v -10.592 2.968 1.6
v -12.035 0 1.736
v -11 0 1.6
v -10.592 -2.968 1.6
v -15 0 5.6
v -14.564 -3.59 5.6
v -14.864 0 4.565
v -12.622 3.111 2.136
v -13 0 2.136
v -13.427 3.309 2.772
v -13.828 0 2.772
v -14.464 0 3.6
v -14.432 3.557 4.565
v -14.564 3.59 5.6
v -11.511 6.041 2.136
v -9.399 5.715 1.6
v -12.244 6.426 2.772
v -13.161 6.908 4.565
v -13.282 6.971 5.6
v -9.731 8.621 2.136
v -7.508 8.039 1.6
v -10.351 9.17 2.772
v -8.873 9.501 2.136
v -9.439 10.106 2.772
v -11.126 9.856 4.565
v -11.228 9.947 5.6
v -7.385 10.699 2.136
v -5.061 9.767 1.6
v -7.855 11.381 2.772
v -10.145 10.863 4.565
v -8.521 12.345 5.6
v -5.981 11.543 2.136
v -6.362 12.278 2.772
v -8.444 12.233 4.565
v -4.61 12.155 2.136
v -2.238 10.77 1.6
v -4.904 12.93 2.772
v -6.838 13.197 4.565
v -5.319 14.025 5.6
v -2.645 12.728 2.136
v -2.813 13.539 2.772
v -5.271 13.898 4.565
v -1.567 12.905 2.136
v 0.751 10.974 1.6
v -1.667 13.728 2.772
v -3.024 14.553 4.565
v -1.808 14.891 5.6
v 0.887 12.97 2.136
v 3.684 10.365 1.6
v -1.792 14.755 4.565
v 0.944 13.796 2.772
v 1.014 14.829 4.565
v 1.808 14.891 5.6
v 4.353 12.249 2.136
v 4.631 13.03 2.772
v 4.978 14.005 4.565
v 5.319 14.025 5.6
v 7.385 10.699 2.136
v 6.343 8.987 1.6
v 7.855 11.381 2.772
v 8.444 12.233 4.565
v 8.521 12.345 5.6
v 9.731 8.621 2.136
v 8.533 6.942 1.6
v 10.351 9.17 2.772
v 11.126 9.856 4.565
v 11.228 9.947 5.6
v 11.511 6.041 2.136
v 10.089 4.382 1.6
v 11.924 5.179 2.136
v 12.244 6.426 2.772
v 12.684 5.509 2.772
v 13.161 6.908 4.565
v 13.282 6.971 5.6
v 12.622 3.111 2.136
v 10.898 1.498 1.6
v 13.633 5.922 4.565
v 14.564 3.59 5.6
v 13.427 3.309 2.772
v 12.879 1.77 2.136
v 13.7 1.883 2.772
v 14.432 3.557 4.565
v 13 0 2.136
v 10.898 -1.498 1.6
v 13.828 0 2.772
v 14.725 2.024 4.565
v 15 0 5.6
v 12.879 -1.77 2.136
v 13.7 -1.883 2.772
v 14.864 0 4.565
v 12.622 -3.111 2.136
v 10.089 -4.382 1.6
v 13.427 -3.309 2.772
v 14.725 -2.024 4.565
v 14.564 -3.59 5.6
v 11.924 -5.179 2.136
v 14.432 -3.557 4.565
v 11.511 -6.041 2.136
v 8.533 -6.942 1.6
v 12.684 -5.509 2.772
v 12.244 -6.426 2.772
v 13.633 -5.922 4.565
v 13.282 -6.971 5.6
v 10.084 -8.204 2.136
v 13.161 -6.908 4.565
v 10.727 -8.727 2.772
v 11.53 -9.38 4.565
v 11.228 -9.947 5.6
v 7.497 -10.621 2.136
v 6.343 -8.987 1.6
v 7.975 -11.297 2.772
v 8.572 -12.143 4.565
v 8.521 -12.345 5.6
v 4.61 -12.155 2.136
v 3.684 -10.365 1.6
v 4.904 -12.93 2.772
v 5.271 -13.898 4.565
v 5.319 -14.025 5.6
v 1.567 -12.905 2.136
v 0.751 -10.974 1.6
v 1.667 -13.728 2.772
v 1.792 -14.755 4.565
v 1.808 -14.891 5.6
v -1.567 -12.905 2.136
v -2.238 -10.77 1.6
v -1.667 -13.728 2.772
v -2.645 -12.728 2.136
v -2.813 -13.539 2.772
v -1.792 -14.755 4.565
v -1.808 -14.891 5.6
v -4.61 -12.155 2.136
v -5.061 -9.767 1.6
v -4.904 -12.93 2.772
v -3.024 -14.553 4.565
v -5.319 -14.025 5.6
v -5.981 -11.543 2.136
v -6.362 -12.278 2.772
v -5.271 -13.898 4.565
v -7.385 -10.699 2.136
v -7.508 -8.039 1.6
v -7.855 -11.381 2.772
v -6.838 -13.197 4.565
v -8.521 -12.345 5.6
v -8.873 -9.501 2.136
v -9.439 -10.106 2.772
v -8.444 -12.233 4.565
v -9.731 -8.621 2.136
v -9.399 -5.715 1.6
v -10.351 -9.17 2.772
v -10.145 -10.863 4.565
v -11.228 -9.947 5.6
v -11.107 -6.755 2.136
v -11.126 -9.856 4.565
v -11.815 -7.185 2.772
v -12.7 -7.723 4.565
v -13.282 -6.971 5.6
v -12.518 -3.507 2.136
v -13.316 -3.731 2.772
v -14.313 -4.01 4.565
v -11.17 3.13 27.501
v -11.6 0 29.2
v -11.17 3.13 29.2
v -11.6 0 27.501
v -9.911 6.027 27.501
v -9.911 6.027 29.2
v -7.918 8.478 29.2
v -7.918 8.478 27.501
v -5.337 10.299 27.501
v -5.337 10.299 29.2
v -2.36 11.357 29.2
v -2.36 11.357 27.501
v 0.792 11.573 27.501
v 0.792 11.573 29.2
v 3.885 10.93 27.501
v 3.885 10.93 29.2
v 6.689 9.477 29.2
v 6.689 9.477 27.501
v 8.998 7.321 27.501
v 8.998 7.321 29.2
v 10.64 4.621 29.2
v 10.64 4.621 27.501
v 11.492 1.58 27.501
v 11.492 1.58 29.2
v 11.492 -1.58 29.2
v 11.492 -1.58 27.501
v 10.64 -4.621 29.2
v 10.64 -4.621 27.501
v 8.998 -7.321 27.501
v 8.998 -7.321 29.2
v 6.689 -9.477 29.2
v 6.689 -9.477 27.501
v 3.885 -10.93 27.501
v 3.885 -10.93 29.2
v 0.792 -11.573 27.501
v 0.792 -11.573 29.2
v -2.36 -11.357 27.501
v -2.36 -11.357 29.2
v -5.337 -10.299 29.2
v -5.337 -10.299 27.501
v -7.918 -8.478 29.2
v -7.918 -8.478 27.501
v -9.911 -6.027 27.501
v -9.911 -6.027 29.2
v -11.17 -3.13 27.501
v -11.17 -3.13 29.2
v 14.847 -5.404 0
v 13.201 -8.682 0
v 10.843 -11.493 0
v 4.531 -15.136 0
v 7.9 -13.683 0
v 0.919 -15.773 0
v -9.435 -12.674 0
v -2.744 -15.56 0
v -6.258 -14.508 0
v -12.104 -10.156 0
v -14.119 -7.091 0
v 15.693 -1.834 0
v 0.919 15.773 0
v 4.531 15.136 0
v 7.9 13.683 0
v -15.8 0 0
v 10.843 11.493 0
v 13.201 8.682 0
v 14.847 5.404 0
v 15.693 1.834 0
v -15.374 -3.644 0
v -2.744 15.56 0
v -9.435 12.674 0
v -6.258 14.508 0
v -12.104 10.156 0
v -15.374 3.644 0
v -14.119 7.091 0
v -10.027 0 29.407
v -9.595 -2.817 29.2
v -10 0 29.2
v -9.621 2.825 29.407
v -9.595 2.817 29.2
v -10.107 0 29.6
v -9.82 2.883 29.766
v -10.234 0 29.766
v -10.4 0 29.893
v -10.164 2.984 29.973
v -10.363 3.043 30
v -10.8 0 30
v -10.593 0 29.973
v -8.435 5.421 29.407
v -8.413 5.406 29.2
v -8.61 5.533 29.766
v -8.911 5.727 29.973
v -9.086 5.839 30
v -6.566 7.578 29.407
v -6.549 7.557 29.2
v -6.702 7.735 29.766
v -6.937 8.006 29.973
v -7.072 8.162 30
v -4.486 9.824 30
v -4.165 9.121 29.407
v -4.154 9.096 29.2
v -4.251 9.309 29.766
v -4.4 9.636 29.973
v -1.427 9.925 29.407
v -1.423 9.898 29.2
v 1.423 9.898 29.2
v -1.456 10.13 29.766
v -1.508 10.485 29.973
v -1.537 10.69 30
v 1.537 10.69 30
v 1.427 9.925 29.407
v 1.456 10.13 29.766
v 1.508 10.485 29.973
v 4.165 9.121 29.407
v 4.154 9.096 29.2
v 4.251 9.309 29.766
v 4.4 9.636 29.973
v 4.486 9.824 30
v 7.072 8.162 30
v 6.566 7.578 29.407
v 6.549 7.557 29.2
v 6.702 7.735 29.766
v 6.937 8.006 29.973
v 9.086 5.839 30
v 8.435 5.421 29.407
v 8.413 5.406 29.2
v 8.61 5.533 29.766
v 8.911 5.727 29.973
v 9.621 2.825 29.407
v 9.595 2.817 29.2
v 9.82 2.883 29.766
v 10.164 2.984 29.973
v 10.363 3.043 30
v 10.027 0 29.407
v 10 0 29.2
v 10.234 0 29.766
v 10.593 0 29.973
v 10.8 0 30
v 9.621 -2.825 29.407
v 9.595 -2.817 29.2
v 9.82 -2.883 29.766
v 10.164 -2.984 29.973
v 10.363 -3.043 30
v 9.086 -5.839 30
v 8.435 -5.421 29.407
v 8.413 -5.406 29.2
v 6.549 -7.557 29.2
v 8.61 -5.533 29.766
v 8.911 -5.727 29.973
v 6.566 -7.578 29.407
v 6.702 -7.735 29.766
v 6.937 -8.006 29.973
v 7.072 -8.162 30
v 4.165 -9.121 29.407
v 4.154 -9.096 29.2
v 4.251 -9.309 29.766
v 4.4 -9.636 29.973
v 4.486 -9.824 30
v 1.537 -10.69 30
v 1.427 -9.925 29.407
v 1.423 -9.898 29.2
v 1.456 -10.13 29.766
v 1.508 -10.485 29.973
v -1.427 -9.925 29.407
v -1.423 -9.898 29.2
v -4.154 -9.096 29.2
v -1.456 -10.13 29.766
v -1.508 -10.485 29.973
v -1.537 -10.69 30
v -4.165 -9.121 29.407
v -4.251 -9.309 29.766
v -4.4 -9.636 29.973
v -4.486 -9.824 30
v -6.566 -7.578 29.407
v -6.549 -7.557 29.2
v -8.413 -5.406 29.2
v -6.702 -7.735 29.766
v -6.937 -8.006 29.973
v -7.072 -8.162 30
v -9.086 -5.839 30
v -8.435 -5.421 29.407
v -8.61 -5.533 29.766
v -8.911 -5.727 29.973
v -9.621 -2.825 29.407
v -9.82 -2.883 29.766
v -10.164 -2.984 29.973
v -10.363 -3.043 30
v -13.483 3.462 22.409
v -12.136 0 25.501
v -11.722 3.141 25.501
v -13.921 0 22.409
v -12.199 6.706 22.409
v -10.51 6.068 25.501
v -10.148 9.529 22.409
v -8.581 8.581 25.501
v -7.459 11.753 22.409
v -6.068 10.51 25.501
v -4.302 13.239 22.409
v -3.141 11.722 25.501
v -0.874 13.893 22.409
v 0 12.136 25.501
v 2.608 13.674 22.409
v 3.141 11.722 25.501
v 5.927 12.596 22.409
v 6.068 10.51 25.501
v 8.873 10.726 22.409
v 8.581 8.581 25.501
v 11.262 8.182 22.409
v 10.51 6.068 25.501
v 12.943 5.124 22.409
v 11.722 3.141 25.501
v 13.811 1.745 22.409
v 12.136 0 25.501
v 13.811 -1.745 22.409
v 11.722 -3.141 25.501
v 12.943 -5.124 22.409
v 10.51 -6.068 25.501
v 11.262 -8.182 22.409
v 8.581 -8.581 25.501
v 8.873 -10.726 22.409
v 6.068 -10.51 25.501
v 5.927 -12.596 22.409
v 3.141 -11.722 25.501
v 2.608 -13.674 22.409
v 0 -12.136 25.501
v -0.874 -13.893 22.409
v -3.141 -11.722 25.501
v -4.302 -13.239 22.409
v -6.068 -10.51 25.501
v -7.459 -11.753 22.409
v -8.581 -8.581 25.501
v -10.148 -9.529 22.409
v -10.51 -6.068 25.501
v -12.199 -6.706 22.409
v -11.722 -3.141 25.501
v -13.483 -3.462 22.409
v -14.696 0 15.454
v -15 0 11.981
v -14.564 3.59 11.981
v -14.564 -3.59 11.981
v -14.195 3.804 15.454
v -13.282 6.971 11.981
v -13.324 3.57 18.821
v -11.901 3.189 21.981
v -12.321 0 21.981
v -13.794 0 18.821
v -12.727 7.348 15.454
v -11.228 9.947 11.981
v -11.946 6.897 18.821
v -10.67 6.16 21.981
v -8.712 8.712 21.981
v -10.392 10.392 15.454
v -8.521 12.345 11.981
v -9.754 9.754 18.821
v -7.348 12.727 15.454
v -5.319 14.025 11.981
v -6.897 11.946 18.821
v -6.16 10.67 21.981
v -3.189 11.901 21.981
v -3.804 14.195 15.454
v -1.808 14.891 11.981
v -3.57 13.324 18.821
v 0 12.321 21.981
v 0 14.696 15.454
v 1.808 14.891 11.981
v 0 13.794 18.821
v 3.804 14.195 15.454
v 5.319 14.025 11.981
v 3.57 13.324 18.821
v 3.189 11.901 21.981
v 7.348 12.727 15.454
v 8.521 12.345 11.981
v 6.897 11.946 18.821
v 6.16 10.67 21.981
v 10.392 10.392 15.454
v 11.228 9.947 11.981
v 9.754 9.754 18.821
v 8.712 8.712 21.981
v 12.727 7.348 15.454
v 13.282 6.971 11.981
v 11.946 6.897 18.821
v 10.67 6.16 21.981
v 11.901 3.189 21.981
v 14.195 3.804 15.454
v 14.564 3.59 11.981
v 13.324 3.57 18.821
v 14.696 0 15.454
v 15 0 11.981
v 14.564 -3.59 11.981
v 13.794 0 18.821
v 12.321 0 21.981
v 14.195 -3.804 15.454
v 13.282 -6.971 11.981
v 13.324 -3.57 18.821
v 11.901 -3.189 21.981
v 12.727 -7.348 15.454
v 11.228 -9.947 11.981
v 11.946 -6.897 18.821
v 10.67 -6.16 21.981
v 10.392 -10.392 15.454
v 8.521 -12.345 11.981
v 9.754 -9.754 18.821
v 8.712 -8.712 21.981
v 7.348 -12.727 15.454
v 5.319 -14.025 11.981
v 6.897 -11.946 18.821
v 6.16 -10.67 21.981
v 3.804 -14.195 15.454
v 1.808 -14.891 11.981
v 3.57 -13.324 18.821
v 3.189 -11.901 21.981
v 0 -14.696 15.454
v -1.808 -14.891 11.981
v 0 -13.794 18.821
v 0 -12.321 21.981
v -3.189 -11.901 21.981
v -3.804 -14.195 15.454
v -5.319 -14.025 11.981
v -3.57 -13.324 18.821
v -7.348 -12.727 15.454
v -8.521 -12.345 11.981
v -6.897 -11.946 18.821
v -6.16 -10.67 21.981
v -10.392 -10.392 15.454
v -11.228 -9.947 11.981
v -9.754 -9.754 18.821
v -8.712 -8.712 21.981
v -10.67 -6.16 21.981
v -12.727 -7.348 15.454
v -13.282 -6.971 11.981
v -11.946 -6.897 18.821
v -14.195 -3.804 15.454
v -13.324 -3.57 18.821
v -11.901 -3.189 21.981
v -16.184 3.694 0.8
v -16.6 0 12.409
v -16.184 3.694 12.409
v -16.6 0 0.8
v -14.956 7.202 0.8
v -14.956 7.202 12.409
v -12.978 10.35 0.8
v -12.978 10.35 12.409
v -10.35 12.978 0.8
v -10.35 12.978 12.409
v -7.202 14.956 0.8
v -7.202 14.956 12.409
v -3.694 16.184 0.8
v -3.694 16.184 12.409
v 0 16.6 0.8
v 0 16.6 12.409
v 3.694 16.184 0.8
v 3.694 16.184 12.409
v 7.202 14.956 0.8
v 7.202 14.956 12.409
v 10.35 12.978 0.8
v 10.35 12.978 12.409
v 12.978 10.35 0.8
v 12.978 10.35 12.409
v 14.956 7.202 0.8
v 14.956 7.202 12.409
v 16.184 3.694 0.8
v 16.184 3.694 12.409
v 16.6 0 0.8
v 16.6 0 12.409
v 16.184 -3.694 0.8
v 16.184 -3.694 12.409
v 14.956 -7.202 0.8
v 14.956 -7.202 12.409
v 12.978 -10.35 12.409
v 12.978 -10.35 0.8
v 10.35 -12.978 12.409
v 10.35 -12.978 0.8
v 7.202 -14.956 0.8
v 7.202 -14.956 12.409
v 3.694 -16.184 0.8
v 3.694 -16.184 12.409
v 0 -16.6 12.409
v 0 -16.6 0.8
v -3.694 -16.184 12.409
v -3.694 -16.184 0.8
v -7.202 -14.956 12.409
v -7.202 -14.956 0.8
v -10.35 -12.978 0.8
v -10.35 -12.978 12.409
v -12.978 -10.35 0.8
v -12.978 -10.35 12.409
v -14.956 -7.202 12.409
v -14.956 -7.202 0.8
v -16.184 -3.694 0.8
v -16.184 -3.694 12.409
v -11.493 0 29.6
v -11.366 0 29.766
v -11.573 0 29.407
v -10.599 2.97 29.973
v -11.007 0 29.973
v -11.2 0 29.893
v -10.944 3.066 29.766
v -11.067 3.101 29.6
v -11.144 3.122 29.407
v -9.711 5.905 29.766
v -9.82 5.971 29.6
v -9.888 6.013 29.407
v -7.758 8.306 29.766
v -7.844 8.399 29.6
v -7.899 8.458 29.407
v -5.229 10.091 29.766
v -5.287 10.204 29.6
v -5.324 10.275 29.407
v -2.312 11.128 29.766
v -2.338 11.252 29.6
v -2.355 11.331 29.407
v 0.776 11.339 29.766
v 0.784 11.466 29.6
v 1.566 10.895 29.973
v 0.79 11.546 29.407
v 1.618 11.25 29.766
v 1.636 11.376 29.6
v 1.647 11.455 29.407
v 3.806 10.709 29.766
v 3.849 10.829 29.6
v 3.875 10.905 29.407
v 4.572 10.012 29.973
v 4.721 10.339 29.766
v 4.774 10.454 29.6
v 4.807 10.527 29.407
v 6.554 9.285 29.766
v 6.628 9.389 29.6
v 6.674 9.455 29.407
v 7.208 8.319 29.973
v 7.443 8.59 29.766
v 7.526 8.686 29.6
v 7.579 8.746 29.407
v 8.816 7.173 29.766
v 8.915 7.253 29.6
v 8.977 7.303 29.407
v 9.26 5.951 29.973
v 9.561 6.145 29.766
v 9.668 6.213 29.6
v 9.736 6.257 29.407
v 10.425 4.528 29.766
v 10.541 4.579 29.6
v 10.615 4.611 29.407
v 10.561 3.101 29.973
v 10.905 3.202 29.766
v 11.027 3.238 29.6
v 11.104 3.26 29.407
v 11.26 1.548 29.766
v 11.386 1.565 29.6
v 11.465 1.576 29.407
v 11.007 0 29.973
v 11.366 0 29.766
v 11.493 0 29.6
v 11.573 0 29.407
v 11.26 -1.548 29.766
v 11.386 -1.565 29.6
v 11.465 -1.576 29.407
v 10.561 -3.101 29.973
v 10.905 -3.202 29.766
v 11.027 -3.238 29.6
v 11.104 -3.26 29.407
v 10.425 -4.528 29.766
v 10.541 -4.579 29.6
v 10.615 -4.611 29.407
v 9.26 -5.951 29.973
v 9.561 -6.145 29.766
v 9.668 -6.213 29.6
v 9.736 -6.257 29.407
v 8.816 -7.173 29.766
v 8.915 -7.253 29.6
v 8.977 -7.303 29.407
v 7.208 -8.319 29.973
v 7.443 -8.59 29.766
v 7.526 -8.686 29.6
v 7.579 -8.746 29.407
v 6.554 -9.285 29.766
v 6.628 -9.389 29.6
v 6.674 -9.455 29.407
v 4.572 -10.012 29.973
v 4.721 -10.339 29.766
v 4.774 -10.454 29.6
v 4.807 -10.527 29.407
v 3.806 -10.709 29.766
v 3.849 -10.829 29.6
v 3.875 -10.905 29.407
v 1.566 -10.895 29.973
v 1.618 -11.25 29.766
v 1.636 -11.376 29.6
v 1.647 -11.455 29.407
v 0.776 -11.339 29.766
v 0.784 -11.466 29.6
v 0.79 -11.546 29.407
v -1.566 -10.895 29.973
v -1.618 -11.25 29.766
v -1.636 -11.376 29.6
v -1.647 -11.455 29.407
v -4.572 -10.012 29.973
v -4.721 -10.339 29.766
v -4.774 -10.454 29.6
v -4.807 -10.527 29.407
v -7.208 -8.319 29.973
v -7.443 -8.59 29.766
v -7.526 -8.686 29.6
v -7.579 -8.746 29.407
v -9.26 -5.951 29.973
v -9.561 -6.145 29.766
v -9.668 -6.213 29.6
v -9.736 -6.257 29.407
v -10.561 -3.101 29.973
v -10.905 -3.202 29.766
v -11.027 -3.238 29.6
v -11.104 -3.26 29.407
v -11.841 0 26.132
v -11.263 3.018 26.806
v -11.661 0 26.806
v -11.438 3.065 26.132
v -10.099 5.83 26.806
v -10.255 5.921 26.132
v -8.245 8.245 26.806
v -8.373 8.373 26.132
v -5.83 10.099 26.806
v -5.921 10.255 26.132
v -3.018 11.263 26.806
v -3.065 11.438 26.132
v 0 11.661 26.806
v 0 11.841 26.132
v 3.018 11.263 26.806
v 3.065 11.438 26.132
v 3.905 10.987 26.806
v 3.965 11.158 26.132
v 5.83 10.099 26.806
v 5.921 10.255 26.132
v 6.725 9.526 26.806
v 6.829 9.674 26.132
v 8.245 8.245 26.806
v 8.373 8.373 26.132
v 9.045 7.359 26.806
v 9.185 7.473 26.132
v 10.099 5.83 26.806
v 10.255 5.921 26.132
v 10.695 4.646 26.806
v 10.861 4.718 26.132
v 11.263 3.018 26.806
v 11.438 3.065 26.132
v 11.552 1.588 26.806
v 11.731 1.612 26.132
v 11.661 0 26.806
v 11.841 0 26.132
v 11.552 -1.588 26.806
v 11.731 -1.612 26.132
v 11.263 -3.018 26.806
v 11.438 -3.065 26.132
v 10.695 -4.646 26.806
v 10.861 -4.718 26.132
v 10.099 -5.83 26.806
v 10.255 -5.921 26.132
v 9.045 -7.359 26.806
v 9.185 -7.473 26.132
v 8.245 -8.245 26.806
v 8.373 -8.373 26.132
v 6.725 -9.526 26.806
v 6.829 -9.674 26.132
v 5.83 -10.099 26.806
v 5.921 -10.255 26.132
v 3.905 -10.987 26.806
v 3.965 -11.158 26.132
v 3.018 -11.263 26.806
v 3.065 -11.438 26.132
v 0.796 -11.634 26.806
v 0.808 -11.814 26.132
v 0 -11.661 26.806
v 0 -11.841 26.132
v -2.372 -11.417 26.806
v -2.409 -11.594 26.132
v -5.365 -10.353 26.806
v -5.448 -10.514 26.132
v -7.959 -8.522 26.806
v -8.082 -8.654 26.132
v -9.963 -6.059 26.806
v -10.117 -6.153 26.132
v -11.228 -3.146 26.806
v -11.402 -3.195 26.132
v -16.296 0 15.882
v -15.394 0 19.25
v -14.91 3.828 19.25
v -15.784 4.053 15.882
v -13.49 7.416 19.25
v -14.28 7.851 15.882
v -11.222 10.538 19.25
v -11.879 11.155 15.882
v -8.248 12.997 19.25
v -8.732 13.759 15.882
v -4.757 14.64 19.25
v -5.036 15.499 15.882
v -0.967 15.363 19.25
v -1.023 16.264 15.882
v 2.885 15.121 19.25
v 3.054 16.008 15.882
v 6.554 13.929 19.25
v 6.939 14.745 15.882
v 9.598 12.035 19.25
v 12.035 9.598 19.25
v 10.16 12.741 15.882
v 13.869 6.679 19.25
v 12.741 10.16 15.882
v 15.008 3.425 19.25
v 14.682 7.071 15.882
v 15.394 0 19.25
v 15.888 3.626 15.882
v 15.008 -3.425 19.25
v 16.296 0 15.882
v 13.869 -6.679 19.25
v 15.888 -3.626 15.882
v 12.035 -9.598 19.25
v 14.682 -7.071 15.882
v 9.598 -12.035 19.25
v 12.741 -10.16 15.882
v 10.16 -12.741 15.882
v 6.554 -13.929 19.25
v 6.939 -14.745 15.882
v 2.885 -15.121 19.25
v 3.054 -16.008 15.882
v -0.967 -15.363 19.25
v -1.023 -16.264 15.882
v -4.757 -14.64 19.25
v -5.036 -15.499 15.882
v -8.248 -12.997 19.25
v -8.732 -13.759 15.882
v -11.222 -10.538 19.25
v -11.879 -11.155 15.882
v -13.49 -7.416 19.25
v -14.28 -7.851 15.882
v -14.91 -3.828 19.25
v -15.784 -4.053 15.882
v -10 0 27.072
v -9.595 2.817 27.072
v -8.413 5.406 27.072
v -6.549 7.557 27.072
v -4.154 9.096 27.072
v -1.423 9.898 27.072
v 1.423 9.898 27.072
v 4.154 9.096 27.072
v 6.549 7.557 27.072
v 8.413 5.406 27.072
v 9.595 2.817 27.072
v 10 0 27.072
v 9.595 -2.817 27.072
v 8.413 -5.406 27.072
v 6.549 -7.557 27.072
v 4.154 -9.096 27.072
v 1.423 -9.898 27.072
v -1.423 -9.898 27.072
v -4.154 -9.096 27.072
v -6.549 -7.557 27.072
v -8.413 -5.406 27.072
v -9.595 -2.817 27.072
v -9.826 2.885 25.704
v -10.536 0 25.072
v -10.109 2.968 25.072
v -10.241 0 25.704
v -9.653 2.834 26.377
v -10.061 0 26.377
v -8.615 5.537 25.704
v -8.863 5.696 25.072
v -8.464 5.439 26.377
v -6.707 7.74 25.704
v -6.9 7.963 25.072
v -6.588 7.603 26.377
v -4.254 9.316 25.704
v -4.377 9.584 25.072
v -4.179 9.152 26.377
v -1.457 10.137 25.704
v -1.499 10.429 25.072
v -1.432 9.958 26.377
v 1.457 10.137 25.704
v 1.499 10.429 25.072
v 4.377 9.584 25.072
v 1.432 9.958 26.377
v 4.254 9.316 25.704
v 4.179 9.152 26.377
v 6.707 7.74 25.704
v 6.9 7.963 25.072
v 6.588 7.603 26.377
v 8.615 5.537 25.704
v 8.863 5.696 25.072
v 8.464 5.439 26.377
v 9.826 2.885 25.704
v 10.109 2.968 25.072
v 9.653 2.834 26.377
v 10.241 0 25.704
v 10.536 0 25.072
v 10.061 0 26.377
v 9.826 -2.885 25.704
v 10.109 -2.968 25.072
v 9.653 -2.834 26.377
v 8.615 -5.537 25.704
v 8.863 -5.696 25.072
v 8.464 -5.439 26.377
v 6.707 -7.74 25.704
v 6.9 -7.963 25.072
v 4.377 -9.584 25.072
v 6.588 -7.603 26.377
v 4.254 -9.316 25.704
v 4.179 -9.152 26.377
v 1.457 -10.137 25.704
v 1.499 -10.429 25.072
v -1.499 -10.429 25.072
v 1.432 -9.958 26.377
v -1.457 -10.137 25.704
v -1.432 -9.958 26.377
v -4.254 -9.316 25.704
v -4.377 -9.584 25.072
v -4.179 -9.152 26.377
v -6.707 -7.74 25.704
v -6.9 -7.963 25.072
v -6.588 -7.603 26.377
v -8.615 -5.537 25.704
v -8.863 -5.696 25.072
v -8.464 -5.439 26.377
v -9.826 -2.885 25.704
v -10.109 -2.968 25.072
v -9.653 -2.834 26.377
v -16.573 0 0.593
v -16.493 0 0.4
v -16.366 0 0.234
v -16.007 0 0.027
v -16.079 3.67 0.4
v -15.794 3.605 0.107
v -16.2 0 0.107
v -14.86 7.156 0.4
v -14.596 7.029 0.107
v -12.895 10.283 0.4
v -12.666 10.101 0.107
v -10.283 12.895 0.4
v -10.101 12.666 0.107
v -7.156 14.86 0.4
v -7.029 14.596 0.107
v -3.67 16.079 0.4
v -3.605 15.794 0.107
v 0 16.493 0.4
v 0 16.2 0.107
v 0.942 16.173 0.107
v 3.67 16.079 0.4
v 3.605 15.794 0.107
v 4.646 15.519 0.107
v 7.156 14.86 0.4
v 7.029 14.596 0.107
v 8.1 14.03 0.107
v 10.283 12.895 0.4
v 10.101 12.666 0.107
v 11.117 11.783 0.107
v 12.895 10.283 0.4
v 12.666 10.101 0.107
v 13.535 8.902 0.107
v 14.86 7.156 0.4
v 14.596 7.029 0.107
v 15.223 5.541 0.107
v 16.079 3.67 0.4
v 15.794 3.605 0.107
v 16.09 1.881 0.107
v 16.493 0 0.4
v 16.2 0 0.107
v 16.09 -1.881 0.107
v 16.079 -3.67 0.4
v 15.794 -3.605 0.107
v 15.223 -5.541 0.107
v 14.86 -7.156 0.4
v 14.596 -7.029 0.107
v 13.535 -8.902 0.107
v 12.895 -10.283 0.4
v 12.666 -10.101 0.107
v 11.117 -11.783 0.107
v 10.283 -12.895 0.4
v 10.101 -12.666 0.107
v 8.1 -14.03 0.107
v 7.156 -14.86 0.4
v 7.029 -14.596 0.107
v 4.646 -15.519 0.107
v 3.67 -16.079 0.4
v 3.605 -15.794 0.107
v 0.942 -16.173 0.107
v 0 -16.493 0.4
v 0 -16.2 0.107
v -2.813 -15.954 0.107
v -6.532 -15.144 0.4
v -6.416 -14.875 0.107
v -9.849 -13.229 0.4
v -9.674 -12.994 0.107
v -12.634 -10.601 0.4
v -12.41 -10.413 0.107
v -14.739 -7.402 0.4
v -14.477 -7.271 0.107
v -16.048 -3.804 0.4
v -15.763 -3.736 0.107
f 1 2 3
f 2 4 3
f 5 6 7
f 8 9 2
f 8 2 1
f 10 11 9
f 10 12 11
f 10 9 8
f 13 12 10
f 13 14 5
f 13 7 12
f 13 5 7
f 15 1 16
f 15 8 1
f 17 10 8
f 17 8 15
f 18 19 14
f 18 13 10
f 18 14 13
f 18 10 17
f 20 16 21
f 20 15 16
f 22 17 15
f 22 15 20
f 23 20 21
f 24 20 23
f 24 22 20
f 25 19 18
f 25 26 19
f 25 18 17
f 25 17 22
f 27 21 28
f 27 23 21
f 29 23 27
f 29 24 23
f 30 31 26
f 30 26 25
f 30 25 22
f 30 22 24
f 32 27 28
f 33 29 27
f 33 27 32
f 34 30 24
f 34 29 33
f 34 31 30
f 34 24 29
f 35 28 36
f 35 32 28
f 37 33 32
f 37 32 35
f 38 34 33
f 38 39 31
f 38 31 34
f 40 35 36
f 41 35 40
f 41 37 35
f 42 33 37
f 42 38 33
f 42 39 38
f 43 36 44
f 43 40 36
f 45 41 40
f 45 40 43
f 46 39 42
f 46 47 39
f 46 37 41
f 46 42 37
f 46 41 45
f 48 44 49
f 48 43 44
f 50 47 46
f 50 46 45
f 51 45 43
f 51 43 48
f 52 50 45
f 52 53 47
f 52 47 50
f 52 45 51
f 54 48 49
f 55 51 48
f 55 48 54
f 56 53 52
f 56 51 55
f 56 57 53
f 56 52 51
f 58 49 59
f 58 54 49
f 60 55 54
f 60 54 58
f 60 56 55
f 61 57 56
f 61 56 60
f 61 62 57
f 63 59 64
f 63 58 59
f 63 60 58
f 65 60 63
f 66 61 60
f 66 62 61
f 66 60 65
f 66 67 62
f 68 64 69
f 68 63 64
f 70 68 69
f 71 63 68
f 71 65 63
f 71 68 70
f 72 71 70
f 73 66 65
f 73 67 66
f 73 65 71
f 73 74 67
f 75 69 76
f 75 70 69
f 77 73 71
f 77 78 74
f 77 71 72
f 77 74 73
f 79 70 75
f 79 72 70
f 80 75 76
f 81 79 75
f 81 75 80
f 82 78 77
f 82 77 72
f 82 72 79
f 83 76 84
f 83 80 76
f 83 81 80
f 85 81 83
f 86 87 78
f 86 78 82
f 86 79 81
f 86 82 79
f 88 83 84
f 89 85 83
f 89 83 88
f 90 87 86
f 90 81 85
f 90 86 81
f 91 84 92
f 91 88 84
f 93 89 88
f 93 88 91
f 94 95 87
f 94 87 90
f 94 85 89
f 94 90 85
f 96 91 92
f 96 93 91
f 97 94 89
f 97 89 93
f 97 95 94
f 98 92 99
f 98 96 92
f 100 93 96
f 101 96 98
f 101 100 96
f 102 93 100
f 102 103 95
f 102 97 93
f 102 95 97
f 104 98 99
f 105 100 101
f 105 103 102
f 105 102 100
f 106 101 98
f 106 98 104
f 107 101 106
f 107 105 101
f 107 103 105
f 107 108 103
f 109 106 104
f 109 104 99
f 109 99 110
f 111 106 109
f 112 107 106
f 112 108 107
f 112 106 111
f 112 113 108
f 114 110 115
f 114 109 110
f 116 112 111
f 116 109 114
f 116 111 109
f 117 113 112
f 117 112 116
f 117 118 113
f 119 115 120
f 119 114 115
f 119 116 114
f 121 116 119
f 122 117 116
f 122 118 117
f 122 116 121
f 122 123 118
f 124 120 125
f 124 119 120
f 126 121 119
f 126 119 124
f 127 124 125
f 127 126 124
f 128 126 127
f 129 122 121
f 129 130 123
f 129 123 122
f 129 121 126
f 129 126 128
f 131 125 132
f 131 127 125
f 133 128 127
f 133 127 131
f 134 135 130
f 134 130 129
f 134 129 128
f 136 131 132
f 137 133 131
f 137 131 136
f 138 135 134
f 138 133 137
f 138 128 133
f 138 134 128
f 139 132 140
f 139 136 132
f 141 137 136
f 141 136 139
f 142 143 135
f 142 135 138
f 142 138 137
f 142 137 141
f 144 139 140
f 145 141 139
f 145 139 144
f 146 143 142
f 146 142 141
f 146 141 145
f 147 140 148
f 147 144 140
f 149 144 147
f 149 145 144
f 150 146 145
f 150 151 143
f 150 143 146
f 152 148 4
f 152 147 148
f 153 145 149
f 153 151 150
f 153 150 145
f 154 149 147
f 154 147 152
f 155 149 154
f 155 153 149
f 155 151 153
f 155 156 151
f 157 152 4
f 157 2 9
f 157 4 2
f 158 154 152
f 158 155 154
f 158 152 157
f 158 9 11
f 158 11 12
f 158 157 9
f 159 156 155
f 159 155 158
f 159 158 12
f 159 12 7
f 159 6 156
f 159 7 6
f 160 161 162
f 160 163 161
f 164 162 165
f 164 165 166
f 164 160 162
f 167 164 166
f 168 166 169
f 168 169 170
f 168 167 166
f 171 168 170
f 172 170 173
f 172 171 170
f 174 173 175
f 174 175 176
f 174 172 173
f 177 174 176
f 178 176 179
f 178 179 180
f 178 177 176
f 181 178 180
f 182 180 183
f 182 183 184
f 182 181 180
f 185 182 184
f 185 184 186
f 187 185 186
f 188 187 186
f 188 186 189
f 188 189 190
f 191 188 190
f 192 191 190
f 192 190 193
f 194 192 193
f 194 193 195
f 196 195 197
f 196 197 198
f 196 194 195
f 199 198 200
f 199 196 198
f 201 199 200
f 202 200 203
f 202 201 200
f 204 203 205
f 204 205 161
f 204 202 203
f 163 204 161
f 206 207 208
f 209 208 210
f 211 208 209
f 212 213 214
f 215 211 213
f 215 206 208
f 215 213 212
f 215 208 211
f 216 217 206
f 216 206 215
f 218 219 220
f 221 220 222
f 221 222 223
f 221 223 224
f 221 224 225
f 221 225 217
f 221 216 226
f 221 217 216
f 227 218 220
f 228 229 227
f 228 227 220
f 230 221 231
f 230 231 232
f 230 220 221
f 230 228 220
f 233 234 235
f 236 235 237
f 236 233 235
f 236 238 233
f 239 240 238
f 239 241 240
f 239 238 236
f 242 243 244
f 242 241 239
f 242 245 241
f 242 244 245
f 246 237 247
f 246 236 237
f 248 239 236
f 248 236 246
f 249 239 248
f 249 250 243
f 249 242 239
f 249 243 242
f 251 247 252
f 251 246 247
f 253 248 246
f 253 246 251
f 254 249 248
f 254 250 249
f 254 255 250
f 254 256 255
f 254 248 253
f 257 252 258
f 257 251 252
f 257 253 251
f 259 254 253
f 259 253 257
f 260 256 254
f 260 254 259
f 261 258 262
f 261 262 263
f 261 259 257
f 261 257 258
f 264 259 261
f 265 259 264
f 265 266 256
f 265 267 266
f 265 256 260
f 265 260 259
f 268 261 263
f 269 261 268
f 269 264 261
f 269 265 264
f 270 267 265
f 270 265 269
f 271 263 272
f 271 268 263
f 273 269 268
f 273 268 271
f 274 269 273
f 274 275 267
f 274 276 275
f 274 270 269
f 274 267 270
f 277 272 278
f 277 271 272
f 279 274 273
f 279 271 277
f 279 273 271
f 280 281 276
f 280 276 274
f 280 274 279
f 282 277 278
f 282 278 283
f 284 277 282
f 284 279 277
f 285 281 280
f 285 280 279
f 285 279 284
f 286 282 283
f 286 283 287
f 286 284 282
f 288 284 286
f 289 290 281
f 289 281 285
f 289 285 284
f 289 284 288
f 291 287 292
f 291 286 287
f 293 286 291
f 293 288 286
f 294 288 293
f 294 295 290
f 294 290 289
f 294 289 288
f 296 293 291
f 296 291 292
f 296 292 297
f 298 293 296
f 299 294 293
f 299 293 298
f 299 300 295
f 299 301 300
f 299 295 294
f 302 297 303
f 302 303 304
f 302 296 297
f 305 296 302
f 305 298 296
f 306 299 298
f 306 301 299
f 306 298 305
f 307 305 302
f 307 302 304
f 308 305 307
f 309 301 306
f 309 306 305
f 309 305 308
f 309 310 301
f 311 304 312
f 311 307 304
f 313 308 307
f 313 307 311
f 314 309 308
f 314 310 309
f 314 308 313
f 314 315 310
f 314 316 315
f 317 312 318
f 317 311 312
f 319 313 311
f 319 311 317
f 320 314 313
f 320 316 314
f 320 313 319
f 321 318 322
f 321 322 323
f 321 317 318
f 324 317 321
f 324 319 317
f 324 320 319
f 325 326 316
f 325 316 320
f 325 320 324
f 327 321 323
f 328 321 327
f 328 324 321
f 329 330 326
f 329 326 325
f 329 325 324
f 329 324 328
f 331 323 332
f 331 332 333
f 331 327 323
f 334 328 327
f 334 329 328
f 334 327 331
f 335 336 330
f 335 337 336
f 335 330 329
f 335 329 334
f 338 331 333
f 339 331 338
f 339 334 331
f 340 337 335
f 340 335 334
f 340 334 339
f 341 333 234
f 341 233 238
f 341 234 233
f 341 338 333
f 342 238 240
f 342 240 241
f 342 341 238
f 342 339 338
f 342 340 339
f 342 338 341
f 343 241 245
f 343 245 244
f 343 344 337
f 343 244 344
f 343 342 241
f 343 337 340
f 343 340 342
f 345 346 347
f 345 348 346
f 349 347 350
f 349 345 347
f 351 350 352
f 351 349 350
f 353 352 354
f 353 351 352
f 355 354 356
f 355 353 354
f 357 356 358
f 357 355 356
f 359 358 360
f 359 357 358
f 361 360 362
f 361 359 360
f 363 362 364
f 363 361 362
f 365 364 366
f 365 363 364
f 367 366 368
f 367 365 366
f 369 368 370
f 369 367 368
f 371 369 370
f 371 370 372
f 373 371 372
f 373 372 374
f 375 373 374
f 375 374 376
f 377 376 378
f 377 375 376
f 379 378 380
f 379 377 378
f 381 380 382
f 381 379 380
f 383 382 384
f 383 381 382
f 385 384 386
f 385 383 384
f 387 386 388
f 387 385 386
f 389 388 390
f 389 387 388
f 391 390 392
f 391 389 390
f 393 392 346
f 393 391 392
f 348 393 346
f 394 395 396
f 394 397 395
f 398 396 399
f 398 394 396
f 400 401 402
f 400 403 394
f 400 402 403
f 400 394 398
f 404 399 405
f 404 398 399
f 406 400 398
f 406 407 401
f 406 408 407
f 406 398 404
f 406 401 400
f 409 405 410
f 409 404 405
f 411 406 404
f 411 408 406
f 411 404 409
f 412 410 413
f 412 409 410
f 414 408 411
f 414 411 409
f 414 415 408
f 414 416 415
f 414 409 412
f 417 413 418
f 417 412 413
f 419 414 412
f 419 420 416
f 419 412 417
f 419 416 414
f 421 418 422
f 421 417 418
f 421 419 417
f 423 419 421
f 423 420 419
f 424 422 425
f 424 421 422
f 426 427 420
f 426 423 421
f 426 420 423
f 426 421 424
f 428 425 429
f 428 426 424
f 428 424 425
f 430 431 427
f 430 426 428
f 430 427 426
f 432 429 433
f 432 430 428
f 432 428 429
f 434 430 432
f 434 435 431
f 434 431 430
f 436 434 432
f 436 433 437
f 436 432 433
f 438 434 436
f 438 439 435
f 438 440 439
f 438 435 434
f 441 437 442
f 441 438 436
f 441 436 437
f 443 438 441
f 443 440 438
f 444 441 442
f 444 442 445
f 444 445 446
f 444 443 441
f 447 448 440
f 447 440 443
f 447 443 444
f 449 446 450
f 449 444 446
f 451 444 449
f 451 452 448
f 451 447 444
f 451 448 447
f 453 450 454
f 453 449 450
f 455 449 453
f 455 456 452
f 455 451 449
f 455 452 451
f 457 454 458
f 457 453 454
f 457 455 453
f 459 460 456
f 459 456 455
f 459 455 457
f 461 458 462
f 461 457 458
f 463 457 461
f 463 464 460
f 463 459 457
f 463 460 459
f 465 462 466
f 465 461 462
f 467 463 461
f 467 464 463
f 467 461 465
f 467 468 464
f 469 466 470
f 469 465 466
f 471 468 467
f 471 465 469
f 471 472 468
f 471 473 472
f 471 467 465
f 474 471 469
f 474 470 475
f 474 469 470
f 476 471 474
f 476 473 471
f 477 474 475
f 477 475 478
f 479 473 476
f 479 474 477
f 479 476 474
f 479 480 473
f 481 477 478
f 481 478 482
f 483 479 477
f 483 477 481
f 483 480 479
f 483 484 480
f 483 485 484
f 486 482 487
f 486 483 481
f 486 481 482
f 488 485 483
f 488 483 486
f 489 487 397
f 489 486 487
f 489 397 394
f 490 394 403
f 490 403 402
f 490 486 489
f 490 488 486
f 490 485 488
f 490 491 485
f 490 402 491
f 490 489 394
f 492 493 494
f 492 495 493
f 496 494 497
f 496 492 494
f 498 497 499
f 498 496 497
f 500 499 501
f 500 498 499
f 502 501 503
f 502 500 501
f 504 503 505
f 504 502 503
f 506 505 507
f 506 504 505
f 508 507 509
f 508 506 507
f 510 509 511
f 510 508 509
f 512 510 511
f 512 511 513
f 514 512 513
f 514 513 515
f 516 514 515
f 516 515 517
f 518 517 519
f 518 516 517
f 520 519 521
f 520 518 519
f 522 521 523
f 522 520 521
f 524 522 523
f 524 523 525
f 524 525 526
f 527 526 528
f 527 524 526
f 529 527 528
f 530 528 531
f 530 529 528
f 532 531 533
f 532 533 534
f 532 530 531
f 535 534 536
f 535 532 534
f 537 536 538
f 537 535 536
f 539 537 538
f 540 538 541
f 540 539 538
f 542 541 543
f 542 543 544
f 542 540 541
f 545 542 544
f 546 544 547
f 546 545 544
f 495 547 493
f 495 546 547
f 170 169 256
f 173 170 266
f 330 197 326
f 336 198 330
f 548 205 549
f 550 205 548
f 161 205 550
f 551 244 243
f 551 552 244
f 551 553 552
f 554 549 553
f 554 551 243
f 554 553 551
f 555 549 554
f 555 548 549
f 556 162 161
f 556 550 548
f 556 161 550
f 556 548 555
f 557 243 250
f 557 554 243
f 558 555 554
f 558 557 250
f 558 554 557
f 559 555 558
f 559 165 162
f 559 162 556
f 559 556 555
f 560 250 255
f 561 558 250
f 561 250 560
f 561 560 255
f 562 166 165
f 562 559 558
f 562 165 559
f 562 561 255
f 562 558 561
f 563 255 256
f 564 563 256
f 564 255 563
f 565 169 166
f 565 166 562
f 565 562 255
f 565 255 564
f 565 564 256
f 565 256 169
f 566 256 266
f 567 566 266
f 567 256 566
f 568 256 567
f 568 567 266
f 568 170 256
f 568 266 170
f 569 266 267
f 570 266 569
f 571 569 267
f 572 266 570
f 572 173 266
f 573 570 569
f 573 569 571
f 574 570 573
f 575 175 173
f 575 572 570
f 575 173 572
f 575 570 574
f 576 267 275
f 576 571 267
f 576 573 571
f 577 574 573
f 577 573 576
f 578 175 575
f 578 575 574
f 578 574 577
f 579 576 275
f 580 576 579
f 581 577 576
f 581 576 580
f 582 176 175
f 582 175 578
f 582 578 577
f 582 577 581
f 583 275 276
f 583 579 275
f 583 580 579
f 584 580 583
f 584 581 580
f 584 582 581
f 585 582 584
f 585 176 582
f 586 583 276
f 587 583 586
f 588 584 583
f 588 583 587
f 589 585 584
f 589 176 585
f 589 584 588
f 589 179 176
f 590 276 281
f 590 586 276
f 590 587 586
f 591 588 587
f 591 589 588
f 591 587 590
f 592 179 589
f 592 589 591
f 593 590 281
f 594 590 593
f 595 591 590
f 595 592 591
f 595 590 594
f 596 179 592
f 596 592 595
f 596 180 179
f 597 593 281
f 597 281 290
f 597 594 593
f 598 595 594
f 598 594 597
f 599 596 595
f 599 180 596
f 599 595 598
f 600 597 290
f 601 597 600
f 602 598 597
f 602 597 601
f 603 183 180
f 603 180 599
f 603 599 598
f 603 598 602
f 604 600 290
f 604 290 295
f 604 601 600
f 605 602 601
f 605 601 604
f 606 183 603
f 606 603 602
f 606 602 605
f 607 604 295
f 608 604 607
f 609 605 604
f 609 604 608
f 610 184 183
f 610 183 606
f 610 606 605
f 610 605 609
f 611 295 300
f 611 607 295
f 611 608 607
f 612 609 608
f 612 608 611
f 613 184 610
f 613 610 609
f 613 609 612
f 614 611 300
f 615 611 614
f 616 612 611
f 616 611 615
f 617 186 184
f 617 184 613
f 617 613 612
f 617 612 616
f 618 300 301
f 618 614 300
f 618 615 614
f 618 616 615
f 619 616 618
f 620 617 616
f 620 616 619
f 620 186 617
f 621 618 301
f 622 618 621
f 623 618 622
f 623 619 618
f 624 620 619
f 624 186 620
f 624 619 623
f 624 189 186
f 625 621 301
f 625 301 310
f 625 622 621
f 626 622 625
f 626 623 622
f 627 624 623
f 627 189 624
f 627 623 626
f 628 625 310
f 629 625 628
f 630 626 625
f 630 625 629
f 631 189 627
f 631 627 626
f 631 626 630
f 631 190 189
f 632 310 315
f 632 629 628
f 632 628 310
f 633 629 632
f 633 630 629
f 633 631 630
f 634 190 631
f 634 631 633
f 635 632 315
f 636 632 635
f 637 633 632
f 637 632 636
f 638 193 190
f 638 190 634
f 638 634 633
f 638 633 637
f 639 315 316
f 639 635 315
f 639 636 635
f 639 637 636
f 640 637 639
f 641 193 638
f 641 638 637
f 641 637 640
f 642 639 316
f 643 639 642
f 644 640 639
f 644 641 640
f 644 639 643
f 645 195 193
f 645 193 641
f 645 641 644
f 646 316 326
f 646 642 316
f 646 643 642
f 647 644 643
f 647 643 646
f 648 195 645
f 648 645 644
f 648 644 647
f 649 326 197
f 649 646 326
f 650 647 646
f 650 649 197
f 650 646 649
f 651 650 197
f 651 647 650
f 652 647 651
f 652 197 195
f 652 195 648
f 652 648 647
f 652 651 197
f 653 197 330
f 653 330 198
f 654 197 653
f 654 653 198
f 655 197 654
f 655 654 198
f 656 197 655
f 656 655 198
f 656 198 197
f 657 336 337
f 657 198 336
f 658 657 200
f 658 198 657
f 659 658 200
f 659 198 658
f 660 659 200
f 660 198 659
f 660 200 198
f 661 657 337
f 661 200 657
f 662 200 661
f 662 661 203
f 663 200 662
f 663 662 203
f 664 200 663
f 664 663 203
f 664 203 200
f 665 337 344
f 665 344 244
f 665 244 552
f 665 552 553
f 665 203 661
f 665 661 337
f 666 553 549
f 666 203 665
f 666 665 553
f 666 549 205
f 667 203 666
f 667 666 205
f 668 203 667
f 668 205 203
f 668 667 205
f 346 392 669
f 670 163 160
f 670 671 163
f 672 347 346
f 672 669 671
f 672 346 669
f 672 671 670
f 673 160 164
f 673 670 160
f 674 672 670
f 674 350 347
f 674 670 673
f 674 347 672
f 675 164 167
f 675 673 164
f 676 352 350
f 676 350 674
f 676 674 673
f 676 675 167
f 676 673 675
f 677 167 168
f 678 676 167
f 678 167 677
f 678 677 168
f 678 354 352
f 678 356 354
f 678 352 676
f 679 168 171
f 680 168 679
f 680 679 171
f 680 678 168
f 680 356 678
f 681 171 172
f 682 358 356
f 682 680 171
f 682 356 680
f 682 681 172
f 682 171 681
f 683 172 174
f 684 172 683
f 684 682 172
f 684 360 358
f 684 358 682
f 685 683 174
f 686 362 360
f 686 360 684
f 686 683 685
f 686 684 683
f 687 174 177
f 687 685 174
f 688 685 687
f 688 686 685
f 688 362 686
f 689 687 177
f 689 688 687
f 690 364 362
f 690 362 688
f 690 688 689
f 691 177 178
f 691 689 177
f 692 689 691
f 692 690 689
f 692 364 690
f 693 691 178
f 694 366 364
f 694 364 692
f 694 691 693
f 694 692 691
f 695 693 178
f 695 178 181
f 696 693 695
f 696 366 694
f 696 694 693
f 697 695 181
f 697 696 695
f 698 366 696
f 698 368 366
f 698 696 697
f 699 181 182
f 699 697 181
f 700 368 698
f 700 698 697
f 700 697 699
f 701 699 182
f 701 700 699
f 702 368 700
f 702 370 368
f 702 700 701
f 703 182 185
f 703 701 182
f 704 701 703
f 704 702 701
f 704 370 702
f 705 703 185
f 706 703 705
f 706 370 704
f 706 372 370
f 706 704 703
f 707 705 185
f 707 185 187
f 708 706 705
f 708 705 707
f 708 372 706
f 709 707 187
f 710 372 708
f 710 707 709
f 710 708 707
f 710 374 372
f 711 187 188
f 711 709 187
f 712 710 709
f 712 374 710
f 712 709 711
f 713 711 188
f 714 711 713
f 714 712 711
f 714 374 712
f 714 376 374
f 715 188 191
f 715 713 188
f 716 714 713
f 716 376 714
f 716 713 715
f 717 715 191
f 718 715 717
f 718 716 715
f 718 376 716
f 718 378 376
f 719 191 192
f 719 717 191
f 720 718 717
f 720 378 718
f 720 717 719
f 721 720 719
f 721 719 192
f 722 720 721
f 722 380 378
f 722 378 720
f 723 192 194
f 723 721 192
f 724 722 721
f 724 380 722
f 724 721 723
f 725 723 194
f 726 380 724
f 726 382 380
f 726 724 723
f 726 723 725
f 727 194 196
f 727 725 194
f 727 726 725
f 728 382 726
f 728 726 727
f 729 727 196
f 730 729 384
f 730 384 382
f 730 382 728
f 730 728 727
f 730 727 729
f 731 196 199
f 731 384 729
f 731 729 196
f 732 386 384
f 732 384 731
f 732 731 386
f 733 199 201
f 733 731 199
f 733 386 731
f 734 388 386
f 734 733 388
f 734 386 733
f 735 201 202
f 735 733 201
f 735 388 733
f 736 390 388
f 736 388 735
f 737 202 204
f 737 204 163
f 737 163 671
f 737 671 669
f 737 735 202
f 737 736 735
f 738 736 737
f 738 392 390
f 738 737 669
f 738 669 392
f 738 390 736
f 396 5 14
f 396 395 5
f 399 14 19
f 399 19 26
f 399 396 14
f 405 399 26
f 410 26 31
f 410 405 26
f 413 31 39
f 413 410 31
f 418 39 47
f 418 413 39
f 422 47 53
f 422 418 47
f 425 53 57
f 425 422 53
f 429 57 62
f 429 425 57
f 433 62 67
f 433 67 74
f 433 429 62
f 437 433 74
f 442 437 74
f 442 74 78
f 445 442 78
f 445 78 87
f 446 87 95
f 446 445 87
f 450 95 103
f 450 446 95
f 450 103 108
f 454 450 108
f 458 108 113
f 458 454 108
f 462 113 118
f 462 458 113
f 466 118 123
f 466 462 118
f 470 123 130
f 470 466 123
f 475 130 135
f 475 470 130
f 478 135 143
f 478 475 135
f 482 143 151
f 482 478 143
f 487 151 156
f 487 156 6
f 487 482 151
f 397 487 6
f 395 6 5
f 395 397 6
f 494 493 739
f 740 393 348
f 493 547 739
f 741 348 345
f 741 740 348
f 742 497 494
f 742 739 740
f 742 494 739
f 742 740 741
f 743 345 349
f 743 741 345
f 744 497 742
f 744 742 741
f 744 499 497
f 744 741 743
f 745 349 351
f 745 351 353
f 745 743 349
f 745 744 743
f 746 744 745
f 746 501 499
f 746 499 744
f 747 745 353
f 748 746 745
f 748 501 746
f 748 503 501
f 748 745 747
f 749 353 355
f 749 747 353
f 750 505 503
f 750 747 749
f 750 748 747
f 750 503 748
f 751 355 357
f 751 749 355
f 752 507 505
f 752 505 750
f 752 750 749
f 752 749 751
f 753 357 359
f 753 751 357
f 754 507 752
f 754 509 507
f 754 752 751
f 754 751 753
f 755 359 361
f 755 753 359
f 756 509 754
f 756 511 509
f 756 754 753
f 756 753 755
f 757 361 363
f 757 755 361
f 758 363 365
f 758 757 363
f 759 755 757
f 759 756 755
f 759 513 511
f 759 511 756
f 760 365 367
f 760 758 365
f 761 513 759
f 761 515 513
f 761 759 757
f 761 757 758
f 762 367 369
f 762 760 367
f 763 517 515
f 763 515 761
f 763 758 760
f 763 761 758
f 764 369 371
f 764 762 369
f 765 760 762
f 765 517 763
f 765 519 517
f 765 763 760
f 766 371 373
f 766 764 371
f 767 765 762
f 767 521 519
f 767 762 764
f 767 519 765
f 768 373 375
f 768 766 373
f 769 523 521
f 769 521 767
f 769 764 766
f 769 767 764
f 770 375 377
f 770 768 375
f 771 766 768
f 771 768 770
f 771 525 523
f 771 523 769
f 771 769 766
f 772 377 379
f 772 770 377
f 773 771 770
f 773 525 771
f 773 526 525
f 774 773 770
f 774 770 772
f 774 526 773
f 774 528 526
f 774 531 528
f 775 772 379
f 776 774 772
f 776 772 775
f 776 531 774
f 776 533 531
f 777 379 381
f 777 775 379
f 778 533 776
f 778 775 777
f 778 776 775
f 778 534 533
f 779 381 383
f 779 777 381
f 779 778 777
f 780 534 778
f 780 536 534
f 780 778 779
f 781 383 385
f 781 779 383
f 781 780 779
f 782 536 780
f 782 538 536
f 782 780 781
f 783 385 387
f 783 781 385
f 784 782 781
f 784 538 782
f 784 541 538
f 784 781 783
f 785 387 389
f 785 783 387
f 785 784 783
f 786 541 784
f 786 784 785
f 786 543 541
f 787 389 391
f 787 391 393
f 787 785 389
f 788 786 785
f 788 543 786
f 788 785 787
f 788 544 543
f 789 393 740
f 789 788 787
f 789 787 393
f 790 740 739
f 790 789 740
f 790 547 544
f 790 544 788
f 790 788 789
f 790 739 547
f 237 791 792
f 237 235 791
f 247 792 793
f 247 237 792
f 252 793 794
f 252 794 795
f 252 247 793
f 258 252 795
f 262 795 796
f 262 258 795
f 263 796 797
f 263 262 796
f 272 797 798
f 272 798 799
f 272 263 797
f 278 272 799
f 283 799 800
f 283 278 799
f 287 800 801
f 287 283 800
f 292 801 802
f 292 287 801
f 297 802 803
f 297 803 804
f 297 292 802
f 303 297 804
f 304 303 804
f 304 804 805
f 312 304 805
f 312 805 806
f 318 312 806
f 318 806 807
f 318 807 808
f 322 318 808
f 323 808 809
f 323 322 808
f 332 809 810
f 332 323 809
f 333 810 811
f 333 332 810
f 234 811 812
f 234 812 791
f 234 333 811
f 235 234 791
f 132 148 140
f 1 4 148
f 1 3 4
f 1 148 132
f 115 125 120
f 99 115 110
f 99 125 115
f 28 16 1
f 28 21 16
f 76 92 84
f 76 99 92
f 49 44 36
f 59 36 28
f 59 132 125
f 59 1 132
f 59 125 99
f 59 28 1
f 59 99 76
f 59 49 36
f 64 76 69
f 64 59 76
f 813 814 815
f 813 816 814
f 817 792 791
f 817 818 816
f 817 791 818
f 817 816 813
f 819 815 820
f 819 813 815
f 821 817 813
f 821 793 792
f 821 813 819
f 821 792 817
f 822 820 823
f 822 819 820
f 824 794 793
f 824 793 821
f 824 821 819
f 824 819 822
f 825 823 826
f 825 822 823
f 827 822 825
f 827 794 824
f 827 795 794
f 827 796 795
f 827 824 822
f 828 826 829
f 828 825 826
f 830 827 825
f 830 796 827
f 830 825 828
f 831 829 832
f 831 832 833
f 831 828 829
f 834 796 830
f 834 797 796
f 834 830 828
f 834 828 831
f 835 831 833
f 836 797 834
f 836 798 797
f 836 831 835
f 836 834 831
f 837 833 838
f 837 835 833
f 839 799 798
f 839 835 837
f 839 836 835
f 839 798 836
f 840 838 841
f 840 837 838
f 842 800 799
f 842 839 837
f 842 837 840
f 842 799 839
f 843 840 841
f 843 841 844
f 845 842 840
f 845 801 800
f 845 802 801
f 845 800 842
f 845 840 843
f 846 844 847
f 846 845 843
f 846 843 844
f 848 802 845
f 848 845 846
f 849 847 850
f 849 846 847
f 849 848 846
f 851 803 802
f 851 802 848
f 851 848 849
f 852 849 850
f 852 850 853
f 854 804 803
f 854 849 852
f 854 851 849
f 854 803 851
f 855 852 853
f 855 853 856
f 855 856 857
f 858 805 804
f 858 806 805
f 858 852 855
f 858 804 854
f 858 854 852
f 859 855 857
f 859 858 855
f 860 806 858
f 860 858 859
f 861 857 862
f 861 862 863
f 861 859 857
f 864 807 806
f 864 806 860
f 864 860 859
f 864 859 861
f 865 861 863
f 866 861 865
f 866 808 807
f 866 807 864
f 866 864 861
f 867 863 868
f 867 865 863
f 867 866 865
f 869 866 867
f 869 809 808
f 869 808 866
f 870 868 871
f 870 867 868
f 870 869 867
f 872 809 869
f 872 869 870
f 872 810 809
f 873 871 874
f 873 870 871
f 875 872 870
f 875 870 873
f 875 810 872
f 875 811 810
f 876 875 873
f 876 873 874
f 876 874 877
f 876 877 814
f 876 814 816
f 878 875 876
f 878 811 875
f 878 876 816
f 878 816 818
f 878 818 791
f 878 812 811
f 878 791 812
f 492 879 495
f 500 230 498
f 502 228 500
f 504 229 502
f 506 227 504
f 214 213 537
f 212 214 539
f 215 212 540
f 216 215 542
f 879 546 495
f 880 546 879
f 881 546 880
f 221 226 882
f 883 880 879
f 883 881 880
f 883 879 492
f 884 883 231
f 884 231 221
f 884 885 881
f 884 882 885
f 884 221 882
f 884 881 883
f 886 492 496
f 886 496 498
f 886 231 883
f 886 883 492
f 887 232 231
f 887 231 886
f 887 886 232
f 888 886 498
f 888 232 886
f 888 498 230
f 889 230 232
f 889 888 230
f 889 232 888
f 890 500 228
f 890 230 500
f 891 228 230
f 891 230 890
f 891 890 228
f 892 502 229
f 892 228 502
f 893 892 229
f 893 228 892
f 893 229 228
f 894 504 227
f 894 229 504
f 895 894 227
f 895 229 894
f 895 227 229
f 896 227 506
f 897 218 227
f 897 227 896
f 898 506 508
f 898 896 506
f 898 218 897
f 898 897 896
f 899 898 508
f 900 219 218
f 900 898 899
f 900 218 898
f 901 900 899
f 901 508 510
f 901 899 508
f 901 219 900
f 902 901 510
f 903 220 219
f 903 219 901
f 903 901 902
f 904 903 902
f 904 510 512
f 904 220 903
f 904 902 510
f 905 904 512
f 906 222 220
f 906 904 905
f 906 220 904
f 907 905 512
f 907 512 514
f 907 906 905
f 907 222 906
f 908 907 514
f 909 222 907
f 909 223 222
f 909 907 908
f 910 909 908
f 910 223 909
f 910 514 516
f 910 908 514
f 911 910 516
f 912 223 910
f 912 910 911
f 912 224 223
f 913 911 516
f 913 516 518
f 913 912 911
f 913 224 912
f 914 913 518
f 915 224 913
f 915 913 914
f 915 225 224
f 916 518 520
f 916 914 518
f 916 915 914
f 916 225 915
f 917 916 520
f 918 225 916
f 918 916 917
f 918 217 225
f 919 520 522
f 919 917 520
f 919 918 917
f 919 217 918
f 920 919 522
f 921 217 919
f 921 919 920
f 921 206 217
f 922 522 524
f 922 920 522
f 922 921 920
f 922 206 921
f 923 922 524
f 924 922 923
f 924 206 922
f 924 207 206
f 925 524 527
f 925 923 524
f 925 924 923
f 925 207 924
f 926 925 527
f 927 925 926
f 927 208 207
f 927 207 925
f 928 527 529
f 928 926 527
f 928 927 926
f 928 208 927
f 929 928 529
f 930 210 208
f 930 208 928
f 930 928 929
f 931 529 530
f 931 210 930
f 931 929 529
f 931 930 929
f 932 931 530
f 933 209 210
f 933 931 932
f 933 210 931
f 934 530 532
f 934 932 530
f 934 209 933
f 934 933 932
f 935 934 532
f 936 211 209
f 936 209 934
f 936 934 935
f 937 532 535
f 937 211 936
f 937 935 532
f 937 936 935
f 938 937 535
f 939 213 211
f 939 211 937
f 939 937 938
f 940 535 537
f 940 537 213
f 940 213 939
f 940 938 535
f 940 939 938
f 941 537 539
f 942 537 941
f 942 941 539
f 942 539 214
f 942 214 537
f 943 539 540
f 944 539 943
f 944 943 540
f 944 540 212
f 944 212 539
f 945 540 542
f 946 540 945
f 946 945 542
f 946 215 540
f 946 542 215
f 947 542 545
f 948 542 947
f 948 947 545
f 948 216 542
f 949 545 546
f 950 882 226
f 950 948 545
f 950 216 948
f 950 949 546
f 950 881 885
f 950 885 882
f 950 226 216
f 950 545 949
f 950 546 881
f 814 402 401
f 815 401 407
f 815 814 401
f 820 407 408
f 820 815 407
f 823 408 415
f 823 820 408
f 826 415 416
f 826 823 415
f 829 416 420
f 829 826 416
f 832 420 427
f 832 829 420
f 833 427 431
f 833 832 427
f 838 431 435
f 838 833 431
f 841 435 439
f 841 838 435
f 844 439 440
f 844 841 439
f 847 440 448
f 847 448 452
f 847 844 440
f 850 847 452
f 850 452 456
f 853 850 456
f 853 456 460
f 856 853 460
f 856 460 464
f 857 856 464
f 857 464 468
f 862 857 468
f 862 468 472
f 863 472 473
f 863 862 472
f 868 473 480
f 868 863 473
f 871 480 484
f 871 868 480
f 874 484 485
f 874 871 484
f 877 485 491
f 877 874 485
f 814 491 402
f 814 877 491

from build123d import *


with BuildPart() as f1:
    # F0 (on Front) → F1 (revolve)
    with BuildSketch(Plane.XZ):
        with BuildLine():
            Line((-15.8, 0), (0, 0))
            Line((0, 0), (0, 1.6))
            Line((0, 1.6), (-11, 1.6))
            ThreePointArc((-11, 1.6), (-13.828427, 2.771573), (-15, 5.6))
            Line((-15, 5.6), (-15, 11.980762))
            ThreePointArc((-15, 11.980762), (-14.318517, 17.157143), (-12.320508, 21.980762))
            Line((-12.320508, 21.980762), (-10.535898, 25.071797))
            ThreePointArc((-10.535898, 25.071797), (-10.136297, 26.036521), (-10, 27.071797))
            Line((-10, 27.071797), (-10, 29.2))
            ThreePointArc((-10, 29.2), (-10.234315, 29.765685), (-10.8, 30))
            ThreePointArc((-10.8, 30), (-11.365685, 29.765685), (-11.6, 29.2))
            Line((-11.6, 29.2), (-11.6, 27.500515))
            ThreePointArc((-11.6, 27.500515), (-11.736297, 26.465239), (-12.135898, 25.500515))
            Line((-12.135898, 25.500515), (-13.920508, 22.409481))
            ThreePointArc((-13.920508, 22.409481), (-15.918517, 17.585862), (-16.6, 12.409481))
            Line((-16.6, 12.409481), (-16.6, 0.8))
            ThreePointArc((-16.6, 0.8), (-16.365685, 0.234315), (-15.8, 0))
        make_face()
    revolve(axis=Axis((0, 0, 17.728048), (0, 0, -1)))


solid = f1.part
